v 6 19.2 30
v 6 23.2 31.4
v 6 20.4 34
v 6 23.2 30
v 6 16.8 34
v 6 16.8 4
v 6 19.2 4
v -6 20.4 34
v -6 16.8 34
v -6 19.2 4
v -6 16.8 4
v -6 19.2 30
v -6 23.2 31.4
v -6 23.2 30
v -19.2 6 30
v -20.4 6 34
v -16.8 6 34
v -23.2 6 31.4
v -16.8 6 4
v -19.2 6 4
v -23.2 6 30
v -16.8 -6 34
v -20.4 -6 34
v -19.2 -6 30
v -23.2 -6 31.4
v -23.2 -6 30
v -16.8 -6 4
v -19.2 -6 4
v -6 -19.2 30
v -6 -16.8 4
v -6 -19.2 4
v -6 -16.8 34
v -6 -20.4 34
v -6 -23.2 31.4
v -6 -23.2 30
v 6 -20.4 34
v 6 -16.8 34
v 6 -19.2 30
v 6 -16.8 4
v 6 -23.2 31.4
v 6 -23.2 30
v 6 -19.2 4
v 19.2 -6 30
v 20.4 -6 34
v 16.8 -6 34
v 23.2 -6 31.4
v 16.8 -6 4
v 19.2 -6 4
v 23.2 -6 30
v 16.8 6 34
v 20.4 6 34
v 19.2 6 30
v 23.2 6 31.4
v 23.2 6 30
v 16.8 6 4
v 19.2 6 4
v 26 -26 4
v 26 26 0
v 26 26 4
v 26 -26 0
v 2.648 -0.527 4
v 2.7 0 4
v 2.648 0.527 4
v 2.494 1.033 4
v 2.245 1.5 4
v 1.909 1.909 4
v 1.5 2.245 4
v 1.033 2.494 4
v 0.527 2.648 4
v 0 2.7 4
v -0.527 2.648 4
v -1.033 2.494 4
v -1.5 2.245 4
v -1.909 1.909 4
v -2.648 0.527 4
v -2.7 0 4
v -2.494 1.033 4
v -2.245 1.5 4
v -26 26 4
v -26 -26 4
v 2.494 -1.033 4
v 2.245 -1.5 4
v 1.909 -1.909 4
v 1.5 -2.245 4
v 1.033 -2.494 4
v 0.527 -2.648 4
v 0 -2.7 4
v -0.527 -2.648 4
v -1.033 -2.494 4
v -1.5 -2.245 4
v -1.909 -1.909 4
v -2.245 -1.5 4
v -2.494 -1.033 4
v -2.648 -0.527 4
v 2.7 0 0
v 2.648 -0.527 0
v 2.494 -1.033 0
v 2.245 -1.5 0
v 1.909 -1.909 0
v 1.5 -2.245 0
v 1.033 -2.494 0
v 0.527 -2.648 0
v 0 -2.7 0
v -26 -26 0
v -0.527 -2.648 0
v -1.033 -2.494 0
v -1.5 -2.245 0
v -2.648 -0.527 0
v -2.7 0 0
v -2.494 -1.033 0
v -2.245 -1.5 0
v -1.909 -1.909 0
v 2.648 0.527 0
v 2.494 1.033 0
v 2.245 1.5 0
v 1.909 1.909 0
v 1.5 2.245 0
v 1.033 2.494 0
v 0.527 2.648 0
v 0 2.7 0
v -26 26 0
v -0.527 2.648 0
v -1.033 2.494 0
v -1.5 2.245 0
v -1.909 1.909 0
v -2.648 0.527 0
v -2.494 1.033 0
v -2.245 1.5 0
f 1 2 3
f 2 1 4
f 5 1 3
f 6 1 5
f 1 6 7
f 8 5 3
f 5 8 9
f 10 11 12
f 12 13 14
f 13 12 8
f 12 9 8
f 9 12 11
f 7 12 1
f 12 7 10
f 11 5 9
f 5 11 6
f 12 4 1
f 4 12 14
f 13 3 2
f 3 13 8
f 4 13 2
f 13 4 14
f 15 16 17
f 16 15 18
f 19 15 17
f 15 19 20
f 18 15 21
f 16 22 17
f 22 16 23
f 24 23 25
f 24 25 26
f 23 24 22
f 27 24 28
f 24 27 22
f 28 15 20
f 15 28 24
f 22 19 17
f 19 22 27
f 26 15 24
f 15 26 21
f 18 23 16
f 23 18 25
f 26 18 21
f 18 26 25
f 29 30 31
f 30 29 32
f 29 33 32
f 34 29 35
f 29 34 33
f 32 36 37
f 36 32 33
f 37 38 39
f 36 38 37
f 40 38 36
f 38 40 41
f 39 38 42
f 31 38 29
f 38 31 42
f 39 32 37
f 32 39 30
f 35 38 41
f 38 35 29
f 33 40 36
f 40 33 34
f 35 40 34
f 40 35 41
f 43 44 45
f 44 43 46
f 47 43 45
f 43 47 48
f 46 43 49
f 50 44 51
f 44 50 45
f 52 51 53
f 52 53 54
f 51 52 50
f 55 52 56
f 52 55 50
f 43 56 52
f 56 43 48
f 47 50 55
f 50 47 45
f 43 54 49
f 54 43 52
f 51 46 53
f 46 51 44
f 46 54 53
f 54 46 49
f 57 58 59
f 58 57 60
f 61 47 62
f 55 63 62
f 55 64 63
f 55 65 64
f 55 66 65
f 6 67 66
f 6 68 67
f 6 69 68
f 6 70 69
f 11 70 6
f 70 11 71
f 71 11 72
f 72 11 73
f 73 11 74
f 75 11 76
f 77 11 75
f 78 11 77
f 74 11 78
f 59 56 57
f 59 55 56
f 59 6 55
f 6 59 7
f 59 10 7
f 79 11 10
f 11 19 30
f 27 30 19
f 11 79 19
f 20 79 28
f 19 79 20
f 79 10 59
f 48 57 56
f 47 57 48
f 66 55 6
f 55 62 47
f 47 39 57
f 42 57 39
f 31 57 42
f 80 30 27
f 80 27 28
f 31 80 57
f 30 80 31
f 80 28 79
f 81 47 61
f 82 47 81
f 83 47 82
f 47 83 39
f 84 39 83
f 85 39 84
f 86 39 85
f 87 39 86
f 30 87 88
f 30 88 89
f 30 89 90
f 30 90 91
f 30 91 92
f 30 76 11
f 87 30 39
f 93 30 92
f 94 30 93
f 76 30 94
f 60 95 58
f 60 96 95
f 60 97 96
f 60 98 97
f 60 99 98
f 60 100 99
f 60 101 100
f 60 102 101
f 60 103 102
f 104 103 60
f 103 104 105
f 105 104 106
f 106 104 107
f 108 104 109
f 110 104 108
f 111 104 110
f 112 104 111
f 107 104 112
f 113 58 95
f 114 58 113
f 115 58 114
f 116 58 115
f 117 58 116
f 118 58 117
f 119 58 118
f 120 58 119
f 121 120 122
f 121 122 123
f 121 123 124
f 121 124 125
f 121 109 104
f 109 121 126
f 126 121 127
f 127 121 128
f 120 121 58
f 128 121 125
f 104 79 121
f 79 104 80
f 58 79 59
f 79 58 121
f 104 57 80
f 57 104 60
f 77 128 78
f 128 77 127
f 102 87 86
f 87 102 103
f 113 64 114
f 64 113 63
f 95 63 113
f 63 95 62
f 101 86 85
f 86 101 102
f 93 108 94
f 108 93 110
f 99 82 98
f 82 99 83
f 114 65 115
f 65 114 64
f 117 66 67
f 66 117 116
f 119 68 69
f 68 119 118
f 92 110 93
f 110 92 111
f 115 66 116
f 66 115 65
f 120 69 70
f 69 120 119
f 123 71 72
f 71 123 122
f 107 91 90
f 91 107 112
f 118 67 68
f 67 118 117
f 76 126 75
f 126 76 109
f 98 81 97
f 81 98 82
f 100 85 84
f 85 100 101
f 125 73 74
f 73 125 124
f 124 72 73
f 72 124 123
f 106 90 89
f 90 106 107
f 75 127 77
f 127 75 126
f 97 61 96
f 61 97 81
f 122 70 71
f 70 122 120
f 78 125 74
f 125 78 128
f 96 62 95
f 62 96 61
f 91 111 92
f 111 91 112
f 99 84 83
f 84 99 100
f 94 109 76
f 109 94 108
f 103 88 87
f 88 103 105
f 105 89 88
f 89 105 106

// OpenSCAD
$fn = 32;

// ----------------------------------------------------------------------
// Snap-fit latch: 4 arms, 30 mm tall, 4.2 mm undercut hooks
// ----------------------------------------------------------------------

// --- parameters (mm) ---
base_d = 52;              // base plate depth
base_h = 4;               // base plate thickness
span = 36;                // distance between opposite arms
arm_t = 2.4;              // arm thickness
arm_d = 12;               // arm width
height = 30;              // free arm length
head_len = 4.2;           // hook reach
head_h = 4;               // hook height
lead = 1.4;               // lead-in ramp thickness
bore_d = 5.4;             // base fixing bore
top_z = 34;               // height of the arm tips above the base

arms = 4;

difference() {
  union() {
    /* base plate, centred on the arm ring */
    translate([-26, -26, 0]) cube([base_d, base_d, base_h]);
    for (a = [0 : 360 / arms : 359]) rotate([0, 0, a]) {
    /* arm, sunk 0.5 mm into the base */
    translate([-arm_d / 2, span / 2 - arm_t / 2, base_h - 0.5]) cube([arm_d, arm_t, height + 0.5]);
    /* hook: a convex hull of a tall inner block and a thin outer lip
       gives a flat undercut below and a lead-in ramp on top */
    hull() {
      translate([-arm_d / 2, span / 2 + arm_t / 2 - 0.6, top_z - head_h]) cube([arm_d, lead + 0.4, head_h]);
      translate([-arm_d / 2, span / 2 + arm_t / 2 - 0.2, top_z - head_h]) cube([arm_d, head_len, lead]);
    }
    }
  }
  translate([0, 0, -2.5]) cylinder(h = base_h + 5, d = bore_d);
}
